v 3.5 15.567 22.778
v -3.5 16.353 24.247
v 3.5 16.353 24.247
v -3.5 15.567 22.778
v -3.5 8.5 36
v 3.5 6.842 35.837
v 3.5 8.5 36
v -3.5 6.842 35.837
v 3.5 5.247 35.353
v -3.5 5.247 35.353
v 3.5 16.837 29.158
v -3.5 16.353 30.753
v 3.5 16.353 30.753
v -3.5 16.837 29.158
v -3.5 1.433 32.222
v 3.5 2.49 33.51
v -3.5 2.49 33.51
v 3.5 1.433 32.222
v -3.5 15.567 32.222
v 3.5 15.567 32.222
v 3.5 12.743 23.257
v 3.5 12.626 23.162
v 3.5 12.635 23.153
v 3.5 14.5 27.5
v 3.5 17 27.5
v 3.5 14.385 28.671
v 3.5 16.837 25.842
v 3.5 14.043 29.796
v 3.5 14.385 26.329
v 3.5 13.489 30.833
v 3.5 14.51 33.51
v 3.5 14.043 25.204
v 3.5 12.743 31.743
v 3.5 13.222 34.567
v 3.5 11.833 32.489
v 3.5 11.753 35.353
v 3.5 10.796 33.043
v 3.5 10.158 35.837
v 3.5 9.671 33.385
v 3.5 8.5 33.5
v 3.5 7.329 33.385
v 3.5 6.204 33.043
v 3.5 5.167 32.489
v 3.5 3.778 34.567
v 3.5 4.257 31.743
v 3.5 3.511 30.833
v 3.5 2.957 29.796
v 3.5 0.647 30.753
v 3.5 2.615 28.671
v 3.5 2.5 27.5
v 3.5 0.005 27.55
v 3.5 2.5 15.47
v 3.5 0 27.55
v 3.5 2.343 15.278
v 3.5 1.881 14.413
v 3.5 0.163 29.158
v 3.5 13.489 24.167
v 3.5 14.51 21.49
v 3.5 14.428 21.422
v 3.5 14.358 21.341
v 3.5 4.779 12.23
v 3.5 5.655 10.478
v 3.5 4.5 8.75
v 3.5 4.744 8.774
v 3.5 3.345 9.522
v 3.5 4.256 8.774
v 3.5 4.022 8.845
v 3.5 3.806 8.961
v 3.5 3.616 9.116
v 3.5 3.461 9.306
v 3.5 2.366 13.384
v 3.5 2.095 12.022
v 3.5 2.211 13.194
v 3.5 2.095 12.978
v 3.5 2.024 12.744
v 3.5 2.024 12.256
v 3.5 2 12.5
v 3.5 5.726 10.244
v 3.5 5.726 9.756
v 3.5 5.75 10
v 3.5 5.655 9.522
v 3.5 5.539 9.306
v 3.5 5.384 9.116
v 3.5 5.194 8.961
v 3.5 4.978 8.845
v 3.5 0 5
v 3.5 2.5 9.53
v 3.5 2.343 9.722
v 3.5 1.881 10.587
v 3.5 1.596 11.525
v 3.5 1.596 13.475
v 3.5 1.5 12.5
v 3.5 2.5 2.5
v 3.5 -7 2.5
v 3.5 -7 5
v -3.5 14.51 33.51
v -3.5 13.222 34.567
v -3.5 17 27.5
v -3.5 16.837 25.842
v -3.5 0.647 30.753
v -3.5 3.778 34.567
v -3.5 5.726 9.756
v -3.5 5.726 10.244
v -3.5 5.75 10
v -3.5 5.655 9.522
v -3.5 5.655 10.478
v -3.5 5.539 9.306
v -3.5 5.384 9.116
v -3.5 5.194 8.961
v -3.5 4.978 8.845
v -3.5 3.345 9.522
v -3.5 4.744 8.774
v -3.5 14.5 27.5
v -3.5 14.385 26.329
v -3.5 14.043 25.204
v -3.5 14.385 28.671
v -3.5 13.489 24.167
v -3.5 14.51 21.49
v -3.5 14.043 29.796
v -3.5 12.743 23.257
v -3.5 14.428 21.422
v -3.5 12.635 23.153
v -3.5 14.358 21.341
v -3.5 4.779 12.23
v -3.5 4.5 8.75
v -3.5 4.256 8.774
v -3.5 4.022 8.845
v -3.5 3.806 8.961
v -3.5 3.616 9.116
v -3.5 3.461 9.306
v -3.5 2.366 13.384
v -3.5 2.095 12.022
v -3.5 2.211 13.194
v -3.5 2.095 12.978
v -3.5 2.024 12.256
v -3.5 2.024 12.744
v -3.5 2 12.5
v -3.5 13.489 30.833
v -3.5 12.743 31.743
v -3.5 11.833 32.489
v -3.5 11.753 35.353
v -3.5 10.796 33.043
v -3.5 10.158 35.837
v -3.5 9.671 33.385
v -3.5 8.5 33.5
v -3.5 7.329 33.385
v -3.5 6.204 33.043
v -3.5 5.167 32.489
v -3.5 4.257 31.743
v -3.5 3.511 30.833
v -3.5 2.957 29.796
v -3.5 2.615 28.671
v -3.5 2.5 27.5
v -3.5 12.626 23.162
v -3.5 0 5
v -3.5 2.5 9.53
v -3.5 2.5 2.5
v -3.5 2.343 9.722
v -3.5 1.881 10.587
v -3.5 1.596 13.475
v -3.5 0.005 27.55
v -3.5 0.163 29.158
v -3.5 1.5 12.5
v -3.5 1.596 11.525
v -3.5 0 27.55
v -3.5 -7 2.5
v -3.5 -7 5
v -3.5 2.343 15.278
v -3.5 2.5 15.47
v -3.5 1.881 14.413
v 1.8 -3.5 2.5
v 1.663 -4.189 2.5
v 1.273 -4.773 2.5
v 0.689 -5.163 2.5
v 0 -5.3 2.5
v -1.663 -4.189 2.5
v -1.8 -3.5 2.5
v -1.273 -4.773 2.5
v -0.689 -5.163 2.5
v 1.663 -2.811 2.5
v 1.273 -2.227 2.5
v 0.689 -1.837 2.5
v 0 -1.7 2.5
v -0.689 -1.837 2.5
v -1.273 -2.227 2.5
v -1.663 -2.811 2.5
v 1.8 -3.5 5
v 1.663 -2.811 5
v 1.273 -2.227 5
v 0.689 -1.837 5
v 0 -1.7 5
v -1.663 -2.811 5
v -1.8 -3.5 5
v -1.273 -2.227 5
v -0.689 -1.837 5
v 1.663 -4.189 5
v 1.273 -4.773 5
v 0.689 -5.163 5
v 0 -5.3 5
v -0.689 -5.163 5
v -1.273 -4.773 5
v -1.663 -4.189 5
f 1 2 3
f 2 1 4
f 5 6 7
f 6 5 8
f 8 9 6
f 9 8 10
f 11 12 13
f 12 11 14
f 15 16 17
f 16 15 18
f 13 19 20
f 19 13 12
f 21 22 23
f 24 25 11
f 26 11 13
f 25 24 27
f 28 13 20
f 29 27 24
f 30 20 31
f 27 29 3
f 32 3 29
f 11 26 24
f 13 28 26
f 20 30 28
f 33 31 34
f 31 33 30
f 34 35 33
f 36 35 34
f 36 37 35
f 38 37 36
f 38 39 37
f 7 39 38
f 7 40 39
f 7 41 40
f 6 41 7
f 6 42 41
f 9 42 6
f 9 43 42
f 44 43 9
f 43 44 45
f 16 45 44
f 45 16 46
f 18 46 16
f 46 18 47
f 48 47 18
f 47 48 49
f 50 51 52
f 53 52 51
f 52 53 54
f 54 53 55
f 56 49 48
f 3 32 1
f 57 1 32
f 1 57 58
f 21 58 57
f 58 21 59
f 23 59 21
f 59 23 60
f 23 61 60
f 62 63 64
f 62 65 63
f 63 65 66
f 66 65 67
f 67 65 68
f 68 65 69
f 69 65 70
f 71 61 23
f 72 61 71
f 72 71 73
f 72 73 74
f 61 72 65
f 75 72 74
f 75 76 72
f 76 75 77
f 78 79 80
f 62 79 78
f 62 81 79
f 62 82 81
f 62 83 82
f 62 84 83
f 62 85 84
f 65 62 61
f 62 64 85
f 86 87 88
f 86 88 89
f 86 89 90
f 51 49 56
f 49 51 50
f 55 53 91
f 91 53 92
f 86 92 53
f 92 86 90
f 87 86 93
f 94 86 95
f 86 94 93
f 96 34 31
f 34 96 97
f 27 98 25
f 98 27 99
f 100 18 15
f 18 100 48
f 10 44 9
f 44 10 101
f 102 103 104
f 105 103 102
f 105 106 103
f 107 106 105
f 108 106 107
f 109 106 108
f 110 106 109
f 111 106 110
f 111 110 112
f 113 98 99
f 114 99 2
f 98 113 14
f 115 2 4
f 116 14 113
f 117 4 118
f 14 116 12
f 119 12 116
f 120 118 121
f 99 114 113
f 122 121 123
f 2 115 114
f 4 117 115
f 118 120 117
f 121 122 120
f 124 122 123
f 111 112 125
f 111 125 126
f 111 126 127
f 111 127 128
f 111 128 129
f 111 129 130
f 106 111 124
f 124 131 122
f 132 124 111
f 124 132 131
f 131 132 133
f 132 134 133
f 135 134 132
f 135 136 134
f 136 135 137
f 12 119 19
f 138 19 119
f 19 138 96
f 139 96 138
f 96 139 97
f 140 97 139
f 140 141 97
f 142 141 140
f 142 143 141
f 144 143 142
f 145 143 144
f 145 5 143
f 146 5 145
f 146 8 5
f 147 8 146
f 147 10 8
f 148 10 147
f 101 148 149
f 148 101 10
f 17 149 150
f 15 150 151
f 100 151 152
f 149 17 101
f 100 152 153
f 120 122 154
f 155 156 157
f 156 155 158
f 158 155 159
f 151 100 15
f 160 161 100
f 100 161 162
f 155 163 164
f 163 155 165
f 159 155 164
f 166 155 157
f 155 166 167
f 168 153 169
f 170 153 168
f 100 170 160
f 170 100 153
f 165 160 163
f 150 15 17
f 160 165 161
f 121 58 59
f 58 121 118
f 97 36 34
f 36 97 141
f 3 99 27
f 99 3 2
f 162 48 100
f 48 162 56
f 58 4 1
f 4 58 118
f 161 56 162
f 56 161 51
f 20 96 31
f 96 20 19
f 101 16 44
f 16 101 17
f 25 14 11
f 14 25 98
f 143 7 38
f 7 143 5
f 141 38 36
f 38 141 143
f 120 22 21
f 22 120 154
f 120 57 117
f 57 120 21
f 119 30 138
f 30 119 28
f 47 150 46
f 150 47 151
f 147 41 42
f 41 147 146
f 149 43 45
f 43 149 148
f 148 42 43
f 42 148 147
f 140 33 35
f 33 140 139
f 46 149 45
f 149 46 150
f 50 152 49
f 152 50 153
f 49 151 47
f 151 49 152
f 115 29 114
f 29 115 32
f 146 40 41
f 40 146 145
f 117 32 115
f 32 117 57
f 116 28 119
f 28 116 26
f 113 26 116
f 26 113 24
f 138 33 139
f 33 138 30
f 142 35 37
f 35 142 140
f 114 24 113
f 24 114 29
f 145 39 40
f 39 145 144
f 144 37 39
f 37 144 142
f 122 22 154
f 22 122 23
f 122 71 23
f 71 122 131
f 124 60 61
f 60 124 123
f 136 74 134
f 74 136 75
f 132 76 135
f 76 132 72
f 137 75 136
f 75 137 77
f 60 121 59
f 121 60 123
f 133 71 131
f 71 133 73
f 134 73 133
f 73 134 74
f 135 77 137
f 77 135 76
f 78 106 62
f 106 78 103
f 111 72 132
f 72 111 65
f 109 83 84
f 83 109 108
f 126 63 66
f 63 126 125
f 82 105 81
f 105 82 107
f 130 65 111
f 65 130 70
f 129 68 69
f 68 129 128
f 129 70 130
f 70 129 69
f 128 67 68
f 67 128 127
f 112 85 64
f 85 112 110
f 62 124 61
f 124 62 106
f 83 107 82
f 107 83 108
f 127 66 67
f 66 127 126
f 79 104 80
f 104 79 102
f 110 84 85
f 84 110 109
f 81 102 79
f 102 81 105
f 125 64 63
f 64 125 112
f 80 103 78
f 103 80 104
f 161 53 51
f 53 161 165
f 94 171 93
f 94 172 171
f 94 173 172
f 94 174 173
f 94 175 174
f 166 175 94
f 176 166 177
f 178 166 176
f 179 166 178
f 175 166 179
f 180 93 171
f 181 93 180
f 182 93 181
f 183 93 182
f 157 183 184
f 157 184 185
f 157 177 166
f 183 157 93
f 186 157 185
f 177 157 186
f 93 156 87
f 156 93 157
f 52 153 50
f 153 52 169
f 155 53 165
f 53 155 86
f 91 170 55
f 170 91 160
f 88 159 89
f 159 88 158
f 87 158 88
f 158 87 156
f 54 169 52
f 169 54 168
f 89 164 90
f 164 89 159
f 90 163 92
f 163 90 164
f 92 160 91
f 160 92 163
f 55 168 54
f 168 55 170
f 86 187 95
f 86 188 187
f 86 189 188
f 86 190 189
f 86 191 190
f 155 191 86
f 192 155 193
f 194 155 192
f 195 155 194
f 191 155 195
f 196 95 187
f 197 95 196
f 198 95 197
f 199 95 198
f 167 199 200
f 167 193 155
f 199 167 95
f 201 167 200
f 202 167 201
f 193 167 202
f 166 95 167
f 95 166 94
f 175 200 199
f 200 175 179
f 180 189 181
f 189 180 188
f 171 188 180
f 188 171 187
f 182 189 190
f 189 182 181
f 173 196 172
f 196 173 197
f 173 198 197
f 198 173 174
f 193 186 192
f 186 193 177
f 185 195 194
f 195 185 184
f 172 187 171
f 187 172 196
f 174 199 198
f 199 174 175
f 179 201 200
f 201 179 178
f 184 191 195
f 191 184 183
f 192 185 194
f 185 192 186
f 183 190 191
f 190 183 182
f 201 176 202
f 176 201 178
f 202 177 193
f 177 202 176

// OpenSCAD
/******************************************************************
*                                                                 *
* OpenFlexure Microscope: Optics unit                             *
*                                                                 *
* This is part of the OpenFlexure microscope, an open-source      *
* microscope and 3-axis translation stage.  It gets really good   *
* precision over a ~10mm range, by using plastic flexure          *
* mechanisms.                                                     *
*                                                                 *
* (c) Richard Bowman, January 2016                                *
* Released under the CERN Open Hardware License                   *
*                                                                 *
******************************************************************/


use <utilities.scad>;

//this is for mini culture plates, 39mm outer diameter and 12.4mm high
sample=[0,19/2,12.4-1.5-9]; //position of clamping point relative to bolt

$fn=32;
d = 0.05;

module sample_clip(sample,t=2.5,w=6,roc=-1,slope=30){
    roc = roc>0 ? roc : sample[2]/2 + sample[1]*sin(slope) - t/2; //radius of curvature
    a = sqrt(pow(sample[1], 2) + pow(sample[2] - roc - t/2, 2));
      //a is the distance from the contact-point cylinder to the 
      //centre of the curved part
    angle = acos( (roc + t/2) / a ) + atan((sample[2] - roc - t/2)/sample[1]); //angle through which we must rotate the join between
    //curved part and straight part
    echo("angle set to:",angle);
    /*angle = 75; //angle of straight part to the vertical
    roc =*/ 
    difference(){
        union(){
            //anchor to stage
            //cylinder(r=w/2,h=t);
            
            translate([0,0,roc+t]) rotate([0,90,0]) difference(){
                cylinder(r=roc+t,h=w,center=true);
                cylinder(r=roc,h=999,center=true);
                translate([0,0,-99]) rotate(0) cube([999,999,999]);
                translate([0,0,-99]) rotate(angle) cube([999,999,999]);
            }
            sequential_hull(){
                translate([0,0,roc+t]) rotate([0,90,0]) rotate(angle) translate([0,roc+t/2,0]) cylinder(r=t/2,h=w,center=true);
                translate([0,sample[1],sample[2]+t/2]) rotate([0,90,0]) cylinder(r=t/2,h=w,center=true);
                translate([0,sample[1]+t,sample[2]+t]) rotate([0,90,0]) cylinder(r=t/2,h=w,center=true);
            }
            
        }
        //cylinder(r=3/2*1.2,h=999,center=true,$fn=16);
    }
}


// we want to clamp the centre of a microscope slide, 12.5mm above the ground
// there will be a spacer 
clip_l = 15;
beam_h = 12.5;
bottom = 2.5;
w = 7;

{
    translate([0,0,clip_l + beam_h]) rotate([-90,0,0]) 
                            sample_clip([0,clip_l,2], w=w, roc=6);
    difference(){
        translate([-w/2,0,bottom]) cube([w, 2.5, beam_h + clip_l + d - bottom]);
        translate([0,2.5+5-1,beam_h]) rotate([0,90,0]) cylinder(h=999, r=5, center=true);
    }
    difference(){
        translate([-w/2,-w,bottom]) cube([w, w+d, 2.5]);
        translate([0,-w/2,-1]) cylinder(r=3/2*1.2, h=999, $fn=16);
    }
}
/*
translate([10,0,0]) sample_clip([0,20,0]);
translate([20,0,0]) sample_clip([0,20,10]);
translate([30,0,0]) sample_clip([0,10,3]);
translate([40,0,0]) sample_clip([0,10,15]);
*/
